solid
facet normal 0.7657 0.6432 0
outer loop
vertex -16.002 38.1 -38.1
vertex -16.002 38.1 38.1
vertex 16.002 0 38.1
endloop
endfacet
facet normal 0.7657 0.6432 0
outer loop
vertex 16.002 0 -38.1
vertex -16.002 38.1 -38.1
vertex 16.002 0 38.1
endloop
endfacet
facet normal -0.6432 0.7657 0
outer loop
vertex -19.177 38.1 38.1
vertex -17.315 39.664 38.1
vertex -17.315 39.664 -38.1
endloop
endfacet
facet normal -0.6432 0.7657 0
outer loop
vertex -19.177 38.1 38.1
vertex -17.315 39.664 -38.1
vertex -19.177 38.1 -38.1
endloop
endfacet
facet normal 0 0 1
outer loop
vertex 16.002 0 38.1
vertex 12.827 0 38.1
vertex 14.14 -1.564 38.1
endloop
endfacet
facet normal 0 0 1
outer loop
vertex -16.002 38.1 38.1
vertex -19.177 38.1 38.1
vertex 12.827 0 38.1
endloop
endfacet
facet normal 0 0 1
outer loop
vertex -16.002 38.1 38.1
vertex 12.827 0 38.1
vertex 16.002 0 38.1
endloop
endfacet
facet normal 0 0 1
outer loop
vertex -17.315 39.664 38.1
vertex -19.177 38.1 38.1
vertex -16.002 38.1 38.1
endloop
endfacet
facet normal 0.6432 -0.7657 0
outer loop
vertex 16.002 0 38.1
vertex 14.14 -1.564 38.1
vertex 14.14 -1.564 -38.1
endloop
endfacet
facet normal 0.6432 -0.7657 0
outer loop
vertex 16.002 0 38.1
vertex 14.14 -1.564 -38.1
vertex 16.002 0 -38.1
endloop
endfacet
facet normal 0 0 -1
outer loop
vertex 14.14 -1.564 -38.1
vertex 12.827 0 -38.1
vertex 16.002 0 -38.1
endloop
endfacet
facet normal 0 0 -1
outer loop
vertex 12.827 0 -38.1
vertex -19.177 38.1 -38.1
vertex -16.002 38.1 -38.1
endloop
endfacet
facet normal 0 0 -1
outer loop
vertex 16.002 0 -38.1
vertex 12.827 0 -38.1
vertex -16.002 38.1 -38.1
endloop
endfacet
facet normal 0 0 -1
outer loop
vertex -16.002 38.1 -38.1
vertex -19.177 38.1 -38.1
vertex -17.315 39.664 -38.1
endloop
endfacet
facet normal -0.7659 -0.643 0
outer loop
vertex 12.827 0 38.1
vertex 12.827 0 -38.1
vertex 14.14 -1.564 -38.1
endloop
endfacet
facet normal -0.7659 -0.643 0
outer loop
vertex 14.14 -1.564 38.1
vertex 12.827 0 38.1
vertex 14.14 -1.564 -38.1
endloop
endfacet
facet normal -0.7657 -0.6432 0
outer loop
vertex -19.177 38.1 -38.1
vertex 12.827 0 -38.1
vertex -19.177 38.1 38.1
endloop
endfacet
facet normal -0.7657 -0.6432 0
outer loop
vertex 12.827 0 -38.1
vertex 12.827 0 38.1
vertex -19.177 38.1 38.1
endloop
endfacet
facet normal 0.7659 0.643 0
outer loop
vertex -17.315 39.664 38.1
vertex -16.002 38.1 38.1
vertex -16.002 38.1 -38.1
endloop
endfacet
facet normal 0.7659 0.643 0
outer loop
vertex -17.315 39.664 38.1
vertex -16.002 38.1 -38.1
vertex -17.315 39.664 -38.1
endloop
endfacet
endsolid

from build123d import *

# Parameters (mm, degrees)
BOSS_EXTRUDE1_DEPTH = 38.1
BOSS_EXTRUDE2_DEPTH = 76.2


with BuildPart() as part:
    # Sketch1 → Boss-Extrude1 (new, symmetric)
    with BuildSketch(Plane.XY):
        Polygon((-16.002, 38.1), (16.002, 0), (12.827, 0), (-19.177, 38.1), align=None)
    extrude(amount=BOSS_EXTRUDE1_DEPTH, both=True)

    # Sketch2 → Boss-Extrude2 (add)
    with BuildSketch(Plane.XY.offset(38.1)):
        Polygon((12.827, 0), (14.140484991, -1.563672608), (16.002, 0), align=None)
        Polygon((-16.002, 38.1), (-17.315484991, 39.663672608), (-19.177, 38.1), align=None)
    extrude(amount=-BOSS_EXTRUDE2_DEPTH)


solid = part.part
